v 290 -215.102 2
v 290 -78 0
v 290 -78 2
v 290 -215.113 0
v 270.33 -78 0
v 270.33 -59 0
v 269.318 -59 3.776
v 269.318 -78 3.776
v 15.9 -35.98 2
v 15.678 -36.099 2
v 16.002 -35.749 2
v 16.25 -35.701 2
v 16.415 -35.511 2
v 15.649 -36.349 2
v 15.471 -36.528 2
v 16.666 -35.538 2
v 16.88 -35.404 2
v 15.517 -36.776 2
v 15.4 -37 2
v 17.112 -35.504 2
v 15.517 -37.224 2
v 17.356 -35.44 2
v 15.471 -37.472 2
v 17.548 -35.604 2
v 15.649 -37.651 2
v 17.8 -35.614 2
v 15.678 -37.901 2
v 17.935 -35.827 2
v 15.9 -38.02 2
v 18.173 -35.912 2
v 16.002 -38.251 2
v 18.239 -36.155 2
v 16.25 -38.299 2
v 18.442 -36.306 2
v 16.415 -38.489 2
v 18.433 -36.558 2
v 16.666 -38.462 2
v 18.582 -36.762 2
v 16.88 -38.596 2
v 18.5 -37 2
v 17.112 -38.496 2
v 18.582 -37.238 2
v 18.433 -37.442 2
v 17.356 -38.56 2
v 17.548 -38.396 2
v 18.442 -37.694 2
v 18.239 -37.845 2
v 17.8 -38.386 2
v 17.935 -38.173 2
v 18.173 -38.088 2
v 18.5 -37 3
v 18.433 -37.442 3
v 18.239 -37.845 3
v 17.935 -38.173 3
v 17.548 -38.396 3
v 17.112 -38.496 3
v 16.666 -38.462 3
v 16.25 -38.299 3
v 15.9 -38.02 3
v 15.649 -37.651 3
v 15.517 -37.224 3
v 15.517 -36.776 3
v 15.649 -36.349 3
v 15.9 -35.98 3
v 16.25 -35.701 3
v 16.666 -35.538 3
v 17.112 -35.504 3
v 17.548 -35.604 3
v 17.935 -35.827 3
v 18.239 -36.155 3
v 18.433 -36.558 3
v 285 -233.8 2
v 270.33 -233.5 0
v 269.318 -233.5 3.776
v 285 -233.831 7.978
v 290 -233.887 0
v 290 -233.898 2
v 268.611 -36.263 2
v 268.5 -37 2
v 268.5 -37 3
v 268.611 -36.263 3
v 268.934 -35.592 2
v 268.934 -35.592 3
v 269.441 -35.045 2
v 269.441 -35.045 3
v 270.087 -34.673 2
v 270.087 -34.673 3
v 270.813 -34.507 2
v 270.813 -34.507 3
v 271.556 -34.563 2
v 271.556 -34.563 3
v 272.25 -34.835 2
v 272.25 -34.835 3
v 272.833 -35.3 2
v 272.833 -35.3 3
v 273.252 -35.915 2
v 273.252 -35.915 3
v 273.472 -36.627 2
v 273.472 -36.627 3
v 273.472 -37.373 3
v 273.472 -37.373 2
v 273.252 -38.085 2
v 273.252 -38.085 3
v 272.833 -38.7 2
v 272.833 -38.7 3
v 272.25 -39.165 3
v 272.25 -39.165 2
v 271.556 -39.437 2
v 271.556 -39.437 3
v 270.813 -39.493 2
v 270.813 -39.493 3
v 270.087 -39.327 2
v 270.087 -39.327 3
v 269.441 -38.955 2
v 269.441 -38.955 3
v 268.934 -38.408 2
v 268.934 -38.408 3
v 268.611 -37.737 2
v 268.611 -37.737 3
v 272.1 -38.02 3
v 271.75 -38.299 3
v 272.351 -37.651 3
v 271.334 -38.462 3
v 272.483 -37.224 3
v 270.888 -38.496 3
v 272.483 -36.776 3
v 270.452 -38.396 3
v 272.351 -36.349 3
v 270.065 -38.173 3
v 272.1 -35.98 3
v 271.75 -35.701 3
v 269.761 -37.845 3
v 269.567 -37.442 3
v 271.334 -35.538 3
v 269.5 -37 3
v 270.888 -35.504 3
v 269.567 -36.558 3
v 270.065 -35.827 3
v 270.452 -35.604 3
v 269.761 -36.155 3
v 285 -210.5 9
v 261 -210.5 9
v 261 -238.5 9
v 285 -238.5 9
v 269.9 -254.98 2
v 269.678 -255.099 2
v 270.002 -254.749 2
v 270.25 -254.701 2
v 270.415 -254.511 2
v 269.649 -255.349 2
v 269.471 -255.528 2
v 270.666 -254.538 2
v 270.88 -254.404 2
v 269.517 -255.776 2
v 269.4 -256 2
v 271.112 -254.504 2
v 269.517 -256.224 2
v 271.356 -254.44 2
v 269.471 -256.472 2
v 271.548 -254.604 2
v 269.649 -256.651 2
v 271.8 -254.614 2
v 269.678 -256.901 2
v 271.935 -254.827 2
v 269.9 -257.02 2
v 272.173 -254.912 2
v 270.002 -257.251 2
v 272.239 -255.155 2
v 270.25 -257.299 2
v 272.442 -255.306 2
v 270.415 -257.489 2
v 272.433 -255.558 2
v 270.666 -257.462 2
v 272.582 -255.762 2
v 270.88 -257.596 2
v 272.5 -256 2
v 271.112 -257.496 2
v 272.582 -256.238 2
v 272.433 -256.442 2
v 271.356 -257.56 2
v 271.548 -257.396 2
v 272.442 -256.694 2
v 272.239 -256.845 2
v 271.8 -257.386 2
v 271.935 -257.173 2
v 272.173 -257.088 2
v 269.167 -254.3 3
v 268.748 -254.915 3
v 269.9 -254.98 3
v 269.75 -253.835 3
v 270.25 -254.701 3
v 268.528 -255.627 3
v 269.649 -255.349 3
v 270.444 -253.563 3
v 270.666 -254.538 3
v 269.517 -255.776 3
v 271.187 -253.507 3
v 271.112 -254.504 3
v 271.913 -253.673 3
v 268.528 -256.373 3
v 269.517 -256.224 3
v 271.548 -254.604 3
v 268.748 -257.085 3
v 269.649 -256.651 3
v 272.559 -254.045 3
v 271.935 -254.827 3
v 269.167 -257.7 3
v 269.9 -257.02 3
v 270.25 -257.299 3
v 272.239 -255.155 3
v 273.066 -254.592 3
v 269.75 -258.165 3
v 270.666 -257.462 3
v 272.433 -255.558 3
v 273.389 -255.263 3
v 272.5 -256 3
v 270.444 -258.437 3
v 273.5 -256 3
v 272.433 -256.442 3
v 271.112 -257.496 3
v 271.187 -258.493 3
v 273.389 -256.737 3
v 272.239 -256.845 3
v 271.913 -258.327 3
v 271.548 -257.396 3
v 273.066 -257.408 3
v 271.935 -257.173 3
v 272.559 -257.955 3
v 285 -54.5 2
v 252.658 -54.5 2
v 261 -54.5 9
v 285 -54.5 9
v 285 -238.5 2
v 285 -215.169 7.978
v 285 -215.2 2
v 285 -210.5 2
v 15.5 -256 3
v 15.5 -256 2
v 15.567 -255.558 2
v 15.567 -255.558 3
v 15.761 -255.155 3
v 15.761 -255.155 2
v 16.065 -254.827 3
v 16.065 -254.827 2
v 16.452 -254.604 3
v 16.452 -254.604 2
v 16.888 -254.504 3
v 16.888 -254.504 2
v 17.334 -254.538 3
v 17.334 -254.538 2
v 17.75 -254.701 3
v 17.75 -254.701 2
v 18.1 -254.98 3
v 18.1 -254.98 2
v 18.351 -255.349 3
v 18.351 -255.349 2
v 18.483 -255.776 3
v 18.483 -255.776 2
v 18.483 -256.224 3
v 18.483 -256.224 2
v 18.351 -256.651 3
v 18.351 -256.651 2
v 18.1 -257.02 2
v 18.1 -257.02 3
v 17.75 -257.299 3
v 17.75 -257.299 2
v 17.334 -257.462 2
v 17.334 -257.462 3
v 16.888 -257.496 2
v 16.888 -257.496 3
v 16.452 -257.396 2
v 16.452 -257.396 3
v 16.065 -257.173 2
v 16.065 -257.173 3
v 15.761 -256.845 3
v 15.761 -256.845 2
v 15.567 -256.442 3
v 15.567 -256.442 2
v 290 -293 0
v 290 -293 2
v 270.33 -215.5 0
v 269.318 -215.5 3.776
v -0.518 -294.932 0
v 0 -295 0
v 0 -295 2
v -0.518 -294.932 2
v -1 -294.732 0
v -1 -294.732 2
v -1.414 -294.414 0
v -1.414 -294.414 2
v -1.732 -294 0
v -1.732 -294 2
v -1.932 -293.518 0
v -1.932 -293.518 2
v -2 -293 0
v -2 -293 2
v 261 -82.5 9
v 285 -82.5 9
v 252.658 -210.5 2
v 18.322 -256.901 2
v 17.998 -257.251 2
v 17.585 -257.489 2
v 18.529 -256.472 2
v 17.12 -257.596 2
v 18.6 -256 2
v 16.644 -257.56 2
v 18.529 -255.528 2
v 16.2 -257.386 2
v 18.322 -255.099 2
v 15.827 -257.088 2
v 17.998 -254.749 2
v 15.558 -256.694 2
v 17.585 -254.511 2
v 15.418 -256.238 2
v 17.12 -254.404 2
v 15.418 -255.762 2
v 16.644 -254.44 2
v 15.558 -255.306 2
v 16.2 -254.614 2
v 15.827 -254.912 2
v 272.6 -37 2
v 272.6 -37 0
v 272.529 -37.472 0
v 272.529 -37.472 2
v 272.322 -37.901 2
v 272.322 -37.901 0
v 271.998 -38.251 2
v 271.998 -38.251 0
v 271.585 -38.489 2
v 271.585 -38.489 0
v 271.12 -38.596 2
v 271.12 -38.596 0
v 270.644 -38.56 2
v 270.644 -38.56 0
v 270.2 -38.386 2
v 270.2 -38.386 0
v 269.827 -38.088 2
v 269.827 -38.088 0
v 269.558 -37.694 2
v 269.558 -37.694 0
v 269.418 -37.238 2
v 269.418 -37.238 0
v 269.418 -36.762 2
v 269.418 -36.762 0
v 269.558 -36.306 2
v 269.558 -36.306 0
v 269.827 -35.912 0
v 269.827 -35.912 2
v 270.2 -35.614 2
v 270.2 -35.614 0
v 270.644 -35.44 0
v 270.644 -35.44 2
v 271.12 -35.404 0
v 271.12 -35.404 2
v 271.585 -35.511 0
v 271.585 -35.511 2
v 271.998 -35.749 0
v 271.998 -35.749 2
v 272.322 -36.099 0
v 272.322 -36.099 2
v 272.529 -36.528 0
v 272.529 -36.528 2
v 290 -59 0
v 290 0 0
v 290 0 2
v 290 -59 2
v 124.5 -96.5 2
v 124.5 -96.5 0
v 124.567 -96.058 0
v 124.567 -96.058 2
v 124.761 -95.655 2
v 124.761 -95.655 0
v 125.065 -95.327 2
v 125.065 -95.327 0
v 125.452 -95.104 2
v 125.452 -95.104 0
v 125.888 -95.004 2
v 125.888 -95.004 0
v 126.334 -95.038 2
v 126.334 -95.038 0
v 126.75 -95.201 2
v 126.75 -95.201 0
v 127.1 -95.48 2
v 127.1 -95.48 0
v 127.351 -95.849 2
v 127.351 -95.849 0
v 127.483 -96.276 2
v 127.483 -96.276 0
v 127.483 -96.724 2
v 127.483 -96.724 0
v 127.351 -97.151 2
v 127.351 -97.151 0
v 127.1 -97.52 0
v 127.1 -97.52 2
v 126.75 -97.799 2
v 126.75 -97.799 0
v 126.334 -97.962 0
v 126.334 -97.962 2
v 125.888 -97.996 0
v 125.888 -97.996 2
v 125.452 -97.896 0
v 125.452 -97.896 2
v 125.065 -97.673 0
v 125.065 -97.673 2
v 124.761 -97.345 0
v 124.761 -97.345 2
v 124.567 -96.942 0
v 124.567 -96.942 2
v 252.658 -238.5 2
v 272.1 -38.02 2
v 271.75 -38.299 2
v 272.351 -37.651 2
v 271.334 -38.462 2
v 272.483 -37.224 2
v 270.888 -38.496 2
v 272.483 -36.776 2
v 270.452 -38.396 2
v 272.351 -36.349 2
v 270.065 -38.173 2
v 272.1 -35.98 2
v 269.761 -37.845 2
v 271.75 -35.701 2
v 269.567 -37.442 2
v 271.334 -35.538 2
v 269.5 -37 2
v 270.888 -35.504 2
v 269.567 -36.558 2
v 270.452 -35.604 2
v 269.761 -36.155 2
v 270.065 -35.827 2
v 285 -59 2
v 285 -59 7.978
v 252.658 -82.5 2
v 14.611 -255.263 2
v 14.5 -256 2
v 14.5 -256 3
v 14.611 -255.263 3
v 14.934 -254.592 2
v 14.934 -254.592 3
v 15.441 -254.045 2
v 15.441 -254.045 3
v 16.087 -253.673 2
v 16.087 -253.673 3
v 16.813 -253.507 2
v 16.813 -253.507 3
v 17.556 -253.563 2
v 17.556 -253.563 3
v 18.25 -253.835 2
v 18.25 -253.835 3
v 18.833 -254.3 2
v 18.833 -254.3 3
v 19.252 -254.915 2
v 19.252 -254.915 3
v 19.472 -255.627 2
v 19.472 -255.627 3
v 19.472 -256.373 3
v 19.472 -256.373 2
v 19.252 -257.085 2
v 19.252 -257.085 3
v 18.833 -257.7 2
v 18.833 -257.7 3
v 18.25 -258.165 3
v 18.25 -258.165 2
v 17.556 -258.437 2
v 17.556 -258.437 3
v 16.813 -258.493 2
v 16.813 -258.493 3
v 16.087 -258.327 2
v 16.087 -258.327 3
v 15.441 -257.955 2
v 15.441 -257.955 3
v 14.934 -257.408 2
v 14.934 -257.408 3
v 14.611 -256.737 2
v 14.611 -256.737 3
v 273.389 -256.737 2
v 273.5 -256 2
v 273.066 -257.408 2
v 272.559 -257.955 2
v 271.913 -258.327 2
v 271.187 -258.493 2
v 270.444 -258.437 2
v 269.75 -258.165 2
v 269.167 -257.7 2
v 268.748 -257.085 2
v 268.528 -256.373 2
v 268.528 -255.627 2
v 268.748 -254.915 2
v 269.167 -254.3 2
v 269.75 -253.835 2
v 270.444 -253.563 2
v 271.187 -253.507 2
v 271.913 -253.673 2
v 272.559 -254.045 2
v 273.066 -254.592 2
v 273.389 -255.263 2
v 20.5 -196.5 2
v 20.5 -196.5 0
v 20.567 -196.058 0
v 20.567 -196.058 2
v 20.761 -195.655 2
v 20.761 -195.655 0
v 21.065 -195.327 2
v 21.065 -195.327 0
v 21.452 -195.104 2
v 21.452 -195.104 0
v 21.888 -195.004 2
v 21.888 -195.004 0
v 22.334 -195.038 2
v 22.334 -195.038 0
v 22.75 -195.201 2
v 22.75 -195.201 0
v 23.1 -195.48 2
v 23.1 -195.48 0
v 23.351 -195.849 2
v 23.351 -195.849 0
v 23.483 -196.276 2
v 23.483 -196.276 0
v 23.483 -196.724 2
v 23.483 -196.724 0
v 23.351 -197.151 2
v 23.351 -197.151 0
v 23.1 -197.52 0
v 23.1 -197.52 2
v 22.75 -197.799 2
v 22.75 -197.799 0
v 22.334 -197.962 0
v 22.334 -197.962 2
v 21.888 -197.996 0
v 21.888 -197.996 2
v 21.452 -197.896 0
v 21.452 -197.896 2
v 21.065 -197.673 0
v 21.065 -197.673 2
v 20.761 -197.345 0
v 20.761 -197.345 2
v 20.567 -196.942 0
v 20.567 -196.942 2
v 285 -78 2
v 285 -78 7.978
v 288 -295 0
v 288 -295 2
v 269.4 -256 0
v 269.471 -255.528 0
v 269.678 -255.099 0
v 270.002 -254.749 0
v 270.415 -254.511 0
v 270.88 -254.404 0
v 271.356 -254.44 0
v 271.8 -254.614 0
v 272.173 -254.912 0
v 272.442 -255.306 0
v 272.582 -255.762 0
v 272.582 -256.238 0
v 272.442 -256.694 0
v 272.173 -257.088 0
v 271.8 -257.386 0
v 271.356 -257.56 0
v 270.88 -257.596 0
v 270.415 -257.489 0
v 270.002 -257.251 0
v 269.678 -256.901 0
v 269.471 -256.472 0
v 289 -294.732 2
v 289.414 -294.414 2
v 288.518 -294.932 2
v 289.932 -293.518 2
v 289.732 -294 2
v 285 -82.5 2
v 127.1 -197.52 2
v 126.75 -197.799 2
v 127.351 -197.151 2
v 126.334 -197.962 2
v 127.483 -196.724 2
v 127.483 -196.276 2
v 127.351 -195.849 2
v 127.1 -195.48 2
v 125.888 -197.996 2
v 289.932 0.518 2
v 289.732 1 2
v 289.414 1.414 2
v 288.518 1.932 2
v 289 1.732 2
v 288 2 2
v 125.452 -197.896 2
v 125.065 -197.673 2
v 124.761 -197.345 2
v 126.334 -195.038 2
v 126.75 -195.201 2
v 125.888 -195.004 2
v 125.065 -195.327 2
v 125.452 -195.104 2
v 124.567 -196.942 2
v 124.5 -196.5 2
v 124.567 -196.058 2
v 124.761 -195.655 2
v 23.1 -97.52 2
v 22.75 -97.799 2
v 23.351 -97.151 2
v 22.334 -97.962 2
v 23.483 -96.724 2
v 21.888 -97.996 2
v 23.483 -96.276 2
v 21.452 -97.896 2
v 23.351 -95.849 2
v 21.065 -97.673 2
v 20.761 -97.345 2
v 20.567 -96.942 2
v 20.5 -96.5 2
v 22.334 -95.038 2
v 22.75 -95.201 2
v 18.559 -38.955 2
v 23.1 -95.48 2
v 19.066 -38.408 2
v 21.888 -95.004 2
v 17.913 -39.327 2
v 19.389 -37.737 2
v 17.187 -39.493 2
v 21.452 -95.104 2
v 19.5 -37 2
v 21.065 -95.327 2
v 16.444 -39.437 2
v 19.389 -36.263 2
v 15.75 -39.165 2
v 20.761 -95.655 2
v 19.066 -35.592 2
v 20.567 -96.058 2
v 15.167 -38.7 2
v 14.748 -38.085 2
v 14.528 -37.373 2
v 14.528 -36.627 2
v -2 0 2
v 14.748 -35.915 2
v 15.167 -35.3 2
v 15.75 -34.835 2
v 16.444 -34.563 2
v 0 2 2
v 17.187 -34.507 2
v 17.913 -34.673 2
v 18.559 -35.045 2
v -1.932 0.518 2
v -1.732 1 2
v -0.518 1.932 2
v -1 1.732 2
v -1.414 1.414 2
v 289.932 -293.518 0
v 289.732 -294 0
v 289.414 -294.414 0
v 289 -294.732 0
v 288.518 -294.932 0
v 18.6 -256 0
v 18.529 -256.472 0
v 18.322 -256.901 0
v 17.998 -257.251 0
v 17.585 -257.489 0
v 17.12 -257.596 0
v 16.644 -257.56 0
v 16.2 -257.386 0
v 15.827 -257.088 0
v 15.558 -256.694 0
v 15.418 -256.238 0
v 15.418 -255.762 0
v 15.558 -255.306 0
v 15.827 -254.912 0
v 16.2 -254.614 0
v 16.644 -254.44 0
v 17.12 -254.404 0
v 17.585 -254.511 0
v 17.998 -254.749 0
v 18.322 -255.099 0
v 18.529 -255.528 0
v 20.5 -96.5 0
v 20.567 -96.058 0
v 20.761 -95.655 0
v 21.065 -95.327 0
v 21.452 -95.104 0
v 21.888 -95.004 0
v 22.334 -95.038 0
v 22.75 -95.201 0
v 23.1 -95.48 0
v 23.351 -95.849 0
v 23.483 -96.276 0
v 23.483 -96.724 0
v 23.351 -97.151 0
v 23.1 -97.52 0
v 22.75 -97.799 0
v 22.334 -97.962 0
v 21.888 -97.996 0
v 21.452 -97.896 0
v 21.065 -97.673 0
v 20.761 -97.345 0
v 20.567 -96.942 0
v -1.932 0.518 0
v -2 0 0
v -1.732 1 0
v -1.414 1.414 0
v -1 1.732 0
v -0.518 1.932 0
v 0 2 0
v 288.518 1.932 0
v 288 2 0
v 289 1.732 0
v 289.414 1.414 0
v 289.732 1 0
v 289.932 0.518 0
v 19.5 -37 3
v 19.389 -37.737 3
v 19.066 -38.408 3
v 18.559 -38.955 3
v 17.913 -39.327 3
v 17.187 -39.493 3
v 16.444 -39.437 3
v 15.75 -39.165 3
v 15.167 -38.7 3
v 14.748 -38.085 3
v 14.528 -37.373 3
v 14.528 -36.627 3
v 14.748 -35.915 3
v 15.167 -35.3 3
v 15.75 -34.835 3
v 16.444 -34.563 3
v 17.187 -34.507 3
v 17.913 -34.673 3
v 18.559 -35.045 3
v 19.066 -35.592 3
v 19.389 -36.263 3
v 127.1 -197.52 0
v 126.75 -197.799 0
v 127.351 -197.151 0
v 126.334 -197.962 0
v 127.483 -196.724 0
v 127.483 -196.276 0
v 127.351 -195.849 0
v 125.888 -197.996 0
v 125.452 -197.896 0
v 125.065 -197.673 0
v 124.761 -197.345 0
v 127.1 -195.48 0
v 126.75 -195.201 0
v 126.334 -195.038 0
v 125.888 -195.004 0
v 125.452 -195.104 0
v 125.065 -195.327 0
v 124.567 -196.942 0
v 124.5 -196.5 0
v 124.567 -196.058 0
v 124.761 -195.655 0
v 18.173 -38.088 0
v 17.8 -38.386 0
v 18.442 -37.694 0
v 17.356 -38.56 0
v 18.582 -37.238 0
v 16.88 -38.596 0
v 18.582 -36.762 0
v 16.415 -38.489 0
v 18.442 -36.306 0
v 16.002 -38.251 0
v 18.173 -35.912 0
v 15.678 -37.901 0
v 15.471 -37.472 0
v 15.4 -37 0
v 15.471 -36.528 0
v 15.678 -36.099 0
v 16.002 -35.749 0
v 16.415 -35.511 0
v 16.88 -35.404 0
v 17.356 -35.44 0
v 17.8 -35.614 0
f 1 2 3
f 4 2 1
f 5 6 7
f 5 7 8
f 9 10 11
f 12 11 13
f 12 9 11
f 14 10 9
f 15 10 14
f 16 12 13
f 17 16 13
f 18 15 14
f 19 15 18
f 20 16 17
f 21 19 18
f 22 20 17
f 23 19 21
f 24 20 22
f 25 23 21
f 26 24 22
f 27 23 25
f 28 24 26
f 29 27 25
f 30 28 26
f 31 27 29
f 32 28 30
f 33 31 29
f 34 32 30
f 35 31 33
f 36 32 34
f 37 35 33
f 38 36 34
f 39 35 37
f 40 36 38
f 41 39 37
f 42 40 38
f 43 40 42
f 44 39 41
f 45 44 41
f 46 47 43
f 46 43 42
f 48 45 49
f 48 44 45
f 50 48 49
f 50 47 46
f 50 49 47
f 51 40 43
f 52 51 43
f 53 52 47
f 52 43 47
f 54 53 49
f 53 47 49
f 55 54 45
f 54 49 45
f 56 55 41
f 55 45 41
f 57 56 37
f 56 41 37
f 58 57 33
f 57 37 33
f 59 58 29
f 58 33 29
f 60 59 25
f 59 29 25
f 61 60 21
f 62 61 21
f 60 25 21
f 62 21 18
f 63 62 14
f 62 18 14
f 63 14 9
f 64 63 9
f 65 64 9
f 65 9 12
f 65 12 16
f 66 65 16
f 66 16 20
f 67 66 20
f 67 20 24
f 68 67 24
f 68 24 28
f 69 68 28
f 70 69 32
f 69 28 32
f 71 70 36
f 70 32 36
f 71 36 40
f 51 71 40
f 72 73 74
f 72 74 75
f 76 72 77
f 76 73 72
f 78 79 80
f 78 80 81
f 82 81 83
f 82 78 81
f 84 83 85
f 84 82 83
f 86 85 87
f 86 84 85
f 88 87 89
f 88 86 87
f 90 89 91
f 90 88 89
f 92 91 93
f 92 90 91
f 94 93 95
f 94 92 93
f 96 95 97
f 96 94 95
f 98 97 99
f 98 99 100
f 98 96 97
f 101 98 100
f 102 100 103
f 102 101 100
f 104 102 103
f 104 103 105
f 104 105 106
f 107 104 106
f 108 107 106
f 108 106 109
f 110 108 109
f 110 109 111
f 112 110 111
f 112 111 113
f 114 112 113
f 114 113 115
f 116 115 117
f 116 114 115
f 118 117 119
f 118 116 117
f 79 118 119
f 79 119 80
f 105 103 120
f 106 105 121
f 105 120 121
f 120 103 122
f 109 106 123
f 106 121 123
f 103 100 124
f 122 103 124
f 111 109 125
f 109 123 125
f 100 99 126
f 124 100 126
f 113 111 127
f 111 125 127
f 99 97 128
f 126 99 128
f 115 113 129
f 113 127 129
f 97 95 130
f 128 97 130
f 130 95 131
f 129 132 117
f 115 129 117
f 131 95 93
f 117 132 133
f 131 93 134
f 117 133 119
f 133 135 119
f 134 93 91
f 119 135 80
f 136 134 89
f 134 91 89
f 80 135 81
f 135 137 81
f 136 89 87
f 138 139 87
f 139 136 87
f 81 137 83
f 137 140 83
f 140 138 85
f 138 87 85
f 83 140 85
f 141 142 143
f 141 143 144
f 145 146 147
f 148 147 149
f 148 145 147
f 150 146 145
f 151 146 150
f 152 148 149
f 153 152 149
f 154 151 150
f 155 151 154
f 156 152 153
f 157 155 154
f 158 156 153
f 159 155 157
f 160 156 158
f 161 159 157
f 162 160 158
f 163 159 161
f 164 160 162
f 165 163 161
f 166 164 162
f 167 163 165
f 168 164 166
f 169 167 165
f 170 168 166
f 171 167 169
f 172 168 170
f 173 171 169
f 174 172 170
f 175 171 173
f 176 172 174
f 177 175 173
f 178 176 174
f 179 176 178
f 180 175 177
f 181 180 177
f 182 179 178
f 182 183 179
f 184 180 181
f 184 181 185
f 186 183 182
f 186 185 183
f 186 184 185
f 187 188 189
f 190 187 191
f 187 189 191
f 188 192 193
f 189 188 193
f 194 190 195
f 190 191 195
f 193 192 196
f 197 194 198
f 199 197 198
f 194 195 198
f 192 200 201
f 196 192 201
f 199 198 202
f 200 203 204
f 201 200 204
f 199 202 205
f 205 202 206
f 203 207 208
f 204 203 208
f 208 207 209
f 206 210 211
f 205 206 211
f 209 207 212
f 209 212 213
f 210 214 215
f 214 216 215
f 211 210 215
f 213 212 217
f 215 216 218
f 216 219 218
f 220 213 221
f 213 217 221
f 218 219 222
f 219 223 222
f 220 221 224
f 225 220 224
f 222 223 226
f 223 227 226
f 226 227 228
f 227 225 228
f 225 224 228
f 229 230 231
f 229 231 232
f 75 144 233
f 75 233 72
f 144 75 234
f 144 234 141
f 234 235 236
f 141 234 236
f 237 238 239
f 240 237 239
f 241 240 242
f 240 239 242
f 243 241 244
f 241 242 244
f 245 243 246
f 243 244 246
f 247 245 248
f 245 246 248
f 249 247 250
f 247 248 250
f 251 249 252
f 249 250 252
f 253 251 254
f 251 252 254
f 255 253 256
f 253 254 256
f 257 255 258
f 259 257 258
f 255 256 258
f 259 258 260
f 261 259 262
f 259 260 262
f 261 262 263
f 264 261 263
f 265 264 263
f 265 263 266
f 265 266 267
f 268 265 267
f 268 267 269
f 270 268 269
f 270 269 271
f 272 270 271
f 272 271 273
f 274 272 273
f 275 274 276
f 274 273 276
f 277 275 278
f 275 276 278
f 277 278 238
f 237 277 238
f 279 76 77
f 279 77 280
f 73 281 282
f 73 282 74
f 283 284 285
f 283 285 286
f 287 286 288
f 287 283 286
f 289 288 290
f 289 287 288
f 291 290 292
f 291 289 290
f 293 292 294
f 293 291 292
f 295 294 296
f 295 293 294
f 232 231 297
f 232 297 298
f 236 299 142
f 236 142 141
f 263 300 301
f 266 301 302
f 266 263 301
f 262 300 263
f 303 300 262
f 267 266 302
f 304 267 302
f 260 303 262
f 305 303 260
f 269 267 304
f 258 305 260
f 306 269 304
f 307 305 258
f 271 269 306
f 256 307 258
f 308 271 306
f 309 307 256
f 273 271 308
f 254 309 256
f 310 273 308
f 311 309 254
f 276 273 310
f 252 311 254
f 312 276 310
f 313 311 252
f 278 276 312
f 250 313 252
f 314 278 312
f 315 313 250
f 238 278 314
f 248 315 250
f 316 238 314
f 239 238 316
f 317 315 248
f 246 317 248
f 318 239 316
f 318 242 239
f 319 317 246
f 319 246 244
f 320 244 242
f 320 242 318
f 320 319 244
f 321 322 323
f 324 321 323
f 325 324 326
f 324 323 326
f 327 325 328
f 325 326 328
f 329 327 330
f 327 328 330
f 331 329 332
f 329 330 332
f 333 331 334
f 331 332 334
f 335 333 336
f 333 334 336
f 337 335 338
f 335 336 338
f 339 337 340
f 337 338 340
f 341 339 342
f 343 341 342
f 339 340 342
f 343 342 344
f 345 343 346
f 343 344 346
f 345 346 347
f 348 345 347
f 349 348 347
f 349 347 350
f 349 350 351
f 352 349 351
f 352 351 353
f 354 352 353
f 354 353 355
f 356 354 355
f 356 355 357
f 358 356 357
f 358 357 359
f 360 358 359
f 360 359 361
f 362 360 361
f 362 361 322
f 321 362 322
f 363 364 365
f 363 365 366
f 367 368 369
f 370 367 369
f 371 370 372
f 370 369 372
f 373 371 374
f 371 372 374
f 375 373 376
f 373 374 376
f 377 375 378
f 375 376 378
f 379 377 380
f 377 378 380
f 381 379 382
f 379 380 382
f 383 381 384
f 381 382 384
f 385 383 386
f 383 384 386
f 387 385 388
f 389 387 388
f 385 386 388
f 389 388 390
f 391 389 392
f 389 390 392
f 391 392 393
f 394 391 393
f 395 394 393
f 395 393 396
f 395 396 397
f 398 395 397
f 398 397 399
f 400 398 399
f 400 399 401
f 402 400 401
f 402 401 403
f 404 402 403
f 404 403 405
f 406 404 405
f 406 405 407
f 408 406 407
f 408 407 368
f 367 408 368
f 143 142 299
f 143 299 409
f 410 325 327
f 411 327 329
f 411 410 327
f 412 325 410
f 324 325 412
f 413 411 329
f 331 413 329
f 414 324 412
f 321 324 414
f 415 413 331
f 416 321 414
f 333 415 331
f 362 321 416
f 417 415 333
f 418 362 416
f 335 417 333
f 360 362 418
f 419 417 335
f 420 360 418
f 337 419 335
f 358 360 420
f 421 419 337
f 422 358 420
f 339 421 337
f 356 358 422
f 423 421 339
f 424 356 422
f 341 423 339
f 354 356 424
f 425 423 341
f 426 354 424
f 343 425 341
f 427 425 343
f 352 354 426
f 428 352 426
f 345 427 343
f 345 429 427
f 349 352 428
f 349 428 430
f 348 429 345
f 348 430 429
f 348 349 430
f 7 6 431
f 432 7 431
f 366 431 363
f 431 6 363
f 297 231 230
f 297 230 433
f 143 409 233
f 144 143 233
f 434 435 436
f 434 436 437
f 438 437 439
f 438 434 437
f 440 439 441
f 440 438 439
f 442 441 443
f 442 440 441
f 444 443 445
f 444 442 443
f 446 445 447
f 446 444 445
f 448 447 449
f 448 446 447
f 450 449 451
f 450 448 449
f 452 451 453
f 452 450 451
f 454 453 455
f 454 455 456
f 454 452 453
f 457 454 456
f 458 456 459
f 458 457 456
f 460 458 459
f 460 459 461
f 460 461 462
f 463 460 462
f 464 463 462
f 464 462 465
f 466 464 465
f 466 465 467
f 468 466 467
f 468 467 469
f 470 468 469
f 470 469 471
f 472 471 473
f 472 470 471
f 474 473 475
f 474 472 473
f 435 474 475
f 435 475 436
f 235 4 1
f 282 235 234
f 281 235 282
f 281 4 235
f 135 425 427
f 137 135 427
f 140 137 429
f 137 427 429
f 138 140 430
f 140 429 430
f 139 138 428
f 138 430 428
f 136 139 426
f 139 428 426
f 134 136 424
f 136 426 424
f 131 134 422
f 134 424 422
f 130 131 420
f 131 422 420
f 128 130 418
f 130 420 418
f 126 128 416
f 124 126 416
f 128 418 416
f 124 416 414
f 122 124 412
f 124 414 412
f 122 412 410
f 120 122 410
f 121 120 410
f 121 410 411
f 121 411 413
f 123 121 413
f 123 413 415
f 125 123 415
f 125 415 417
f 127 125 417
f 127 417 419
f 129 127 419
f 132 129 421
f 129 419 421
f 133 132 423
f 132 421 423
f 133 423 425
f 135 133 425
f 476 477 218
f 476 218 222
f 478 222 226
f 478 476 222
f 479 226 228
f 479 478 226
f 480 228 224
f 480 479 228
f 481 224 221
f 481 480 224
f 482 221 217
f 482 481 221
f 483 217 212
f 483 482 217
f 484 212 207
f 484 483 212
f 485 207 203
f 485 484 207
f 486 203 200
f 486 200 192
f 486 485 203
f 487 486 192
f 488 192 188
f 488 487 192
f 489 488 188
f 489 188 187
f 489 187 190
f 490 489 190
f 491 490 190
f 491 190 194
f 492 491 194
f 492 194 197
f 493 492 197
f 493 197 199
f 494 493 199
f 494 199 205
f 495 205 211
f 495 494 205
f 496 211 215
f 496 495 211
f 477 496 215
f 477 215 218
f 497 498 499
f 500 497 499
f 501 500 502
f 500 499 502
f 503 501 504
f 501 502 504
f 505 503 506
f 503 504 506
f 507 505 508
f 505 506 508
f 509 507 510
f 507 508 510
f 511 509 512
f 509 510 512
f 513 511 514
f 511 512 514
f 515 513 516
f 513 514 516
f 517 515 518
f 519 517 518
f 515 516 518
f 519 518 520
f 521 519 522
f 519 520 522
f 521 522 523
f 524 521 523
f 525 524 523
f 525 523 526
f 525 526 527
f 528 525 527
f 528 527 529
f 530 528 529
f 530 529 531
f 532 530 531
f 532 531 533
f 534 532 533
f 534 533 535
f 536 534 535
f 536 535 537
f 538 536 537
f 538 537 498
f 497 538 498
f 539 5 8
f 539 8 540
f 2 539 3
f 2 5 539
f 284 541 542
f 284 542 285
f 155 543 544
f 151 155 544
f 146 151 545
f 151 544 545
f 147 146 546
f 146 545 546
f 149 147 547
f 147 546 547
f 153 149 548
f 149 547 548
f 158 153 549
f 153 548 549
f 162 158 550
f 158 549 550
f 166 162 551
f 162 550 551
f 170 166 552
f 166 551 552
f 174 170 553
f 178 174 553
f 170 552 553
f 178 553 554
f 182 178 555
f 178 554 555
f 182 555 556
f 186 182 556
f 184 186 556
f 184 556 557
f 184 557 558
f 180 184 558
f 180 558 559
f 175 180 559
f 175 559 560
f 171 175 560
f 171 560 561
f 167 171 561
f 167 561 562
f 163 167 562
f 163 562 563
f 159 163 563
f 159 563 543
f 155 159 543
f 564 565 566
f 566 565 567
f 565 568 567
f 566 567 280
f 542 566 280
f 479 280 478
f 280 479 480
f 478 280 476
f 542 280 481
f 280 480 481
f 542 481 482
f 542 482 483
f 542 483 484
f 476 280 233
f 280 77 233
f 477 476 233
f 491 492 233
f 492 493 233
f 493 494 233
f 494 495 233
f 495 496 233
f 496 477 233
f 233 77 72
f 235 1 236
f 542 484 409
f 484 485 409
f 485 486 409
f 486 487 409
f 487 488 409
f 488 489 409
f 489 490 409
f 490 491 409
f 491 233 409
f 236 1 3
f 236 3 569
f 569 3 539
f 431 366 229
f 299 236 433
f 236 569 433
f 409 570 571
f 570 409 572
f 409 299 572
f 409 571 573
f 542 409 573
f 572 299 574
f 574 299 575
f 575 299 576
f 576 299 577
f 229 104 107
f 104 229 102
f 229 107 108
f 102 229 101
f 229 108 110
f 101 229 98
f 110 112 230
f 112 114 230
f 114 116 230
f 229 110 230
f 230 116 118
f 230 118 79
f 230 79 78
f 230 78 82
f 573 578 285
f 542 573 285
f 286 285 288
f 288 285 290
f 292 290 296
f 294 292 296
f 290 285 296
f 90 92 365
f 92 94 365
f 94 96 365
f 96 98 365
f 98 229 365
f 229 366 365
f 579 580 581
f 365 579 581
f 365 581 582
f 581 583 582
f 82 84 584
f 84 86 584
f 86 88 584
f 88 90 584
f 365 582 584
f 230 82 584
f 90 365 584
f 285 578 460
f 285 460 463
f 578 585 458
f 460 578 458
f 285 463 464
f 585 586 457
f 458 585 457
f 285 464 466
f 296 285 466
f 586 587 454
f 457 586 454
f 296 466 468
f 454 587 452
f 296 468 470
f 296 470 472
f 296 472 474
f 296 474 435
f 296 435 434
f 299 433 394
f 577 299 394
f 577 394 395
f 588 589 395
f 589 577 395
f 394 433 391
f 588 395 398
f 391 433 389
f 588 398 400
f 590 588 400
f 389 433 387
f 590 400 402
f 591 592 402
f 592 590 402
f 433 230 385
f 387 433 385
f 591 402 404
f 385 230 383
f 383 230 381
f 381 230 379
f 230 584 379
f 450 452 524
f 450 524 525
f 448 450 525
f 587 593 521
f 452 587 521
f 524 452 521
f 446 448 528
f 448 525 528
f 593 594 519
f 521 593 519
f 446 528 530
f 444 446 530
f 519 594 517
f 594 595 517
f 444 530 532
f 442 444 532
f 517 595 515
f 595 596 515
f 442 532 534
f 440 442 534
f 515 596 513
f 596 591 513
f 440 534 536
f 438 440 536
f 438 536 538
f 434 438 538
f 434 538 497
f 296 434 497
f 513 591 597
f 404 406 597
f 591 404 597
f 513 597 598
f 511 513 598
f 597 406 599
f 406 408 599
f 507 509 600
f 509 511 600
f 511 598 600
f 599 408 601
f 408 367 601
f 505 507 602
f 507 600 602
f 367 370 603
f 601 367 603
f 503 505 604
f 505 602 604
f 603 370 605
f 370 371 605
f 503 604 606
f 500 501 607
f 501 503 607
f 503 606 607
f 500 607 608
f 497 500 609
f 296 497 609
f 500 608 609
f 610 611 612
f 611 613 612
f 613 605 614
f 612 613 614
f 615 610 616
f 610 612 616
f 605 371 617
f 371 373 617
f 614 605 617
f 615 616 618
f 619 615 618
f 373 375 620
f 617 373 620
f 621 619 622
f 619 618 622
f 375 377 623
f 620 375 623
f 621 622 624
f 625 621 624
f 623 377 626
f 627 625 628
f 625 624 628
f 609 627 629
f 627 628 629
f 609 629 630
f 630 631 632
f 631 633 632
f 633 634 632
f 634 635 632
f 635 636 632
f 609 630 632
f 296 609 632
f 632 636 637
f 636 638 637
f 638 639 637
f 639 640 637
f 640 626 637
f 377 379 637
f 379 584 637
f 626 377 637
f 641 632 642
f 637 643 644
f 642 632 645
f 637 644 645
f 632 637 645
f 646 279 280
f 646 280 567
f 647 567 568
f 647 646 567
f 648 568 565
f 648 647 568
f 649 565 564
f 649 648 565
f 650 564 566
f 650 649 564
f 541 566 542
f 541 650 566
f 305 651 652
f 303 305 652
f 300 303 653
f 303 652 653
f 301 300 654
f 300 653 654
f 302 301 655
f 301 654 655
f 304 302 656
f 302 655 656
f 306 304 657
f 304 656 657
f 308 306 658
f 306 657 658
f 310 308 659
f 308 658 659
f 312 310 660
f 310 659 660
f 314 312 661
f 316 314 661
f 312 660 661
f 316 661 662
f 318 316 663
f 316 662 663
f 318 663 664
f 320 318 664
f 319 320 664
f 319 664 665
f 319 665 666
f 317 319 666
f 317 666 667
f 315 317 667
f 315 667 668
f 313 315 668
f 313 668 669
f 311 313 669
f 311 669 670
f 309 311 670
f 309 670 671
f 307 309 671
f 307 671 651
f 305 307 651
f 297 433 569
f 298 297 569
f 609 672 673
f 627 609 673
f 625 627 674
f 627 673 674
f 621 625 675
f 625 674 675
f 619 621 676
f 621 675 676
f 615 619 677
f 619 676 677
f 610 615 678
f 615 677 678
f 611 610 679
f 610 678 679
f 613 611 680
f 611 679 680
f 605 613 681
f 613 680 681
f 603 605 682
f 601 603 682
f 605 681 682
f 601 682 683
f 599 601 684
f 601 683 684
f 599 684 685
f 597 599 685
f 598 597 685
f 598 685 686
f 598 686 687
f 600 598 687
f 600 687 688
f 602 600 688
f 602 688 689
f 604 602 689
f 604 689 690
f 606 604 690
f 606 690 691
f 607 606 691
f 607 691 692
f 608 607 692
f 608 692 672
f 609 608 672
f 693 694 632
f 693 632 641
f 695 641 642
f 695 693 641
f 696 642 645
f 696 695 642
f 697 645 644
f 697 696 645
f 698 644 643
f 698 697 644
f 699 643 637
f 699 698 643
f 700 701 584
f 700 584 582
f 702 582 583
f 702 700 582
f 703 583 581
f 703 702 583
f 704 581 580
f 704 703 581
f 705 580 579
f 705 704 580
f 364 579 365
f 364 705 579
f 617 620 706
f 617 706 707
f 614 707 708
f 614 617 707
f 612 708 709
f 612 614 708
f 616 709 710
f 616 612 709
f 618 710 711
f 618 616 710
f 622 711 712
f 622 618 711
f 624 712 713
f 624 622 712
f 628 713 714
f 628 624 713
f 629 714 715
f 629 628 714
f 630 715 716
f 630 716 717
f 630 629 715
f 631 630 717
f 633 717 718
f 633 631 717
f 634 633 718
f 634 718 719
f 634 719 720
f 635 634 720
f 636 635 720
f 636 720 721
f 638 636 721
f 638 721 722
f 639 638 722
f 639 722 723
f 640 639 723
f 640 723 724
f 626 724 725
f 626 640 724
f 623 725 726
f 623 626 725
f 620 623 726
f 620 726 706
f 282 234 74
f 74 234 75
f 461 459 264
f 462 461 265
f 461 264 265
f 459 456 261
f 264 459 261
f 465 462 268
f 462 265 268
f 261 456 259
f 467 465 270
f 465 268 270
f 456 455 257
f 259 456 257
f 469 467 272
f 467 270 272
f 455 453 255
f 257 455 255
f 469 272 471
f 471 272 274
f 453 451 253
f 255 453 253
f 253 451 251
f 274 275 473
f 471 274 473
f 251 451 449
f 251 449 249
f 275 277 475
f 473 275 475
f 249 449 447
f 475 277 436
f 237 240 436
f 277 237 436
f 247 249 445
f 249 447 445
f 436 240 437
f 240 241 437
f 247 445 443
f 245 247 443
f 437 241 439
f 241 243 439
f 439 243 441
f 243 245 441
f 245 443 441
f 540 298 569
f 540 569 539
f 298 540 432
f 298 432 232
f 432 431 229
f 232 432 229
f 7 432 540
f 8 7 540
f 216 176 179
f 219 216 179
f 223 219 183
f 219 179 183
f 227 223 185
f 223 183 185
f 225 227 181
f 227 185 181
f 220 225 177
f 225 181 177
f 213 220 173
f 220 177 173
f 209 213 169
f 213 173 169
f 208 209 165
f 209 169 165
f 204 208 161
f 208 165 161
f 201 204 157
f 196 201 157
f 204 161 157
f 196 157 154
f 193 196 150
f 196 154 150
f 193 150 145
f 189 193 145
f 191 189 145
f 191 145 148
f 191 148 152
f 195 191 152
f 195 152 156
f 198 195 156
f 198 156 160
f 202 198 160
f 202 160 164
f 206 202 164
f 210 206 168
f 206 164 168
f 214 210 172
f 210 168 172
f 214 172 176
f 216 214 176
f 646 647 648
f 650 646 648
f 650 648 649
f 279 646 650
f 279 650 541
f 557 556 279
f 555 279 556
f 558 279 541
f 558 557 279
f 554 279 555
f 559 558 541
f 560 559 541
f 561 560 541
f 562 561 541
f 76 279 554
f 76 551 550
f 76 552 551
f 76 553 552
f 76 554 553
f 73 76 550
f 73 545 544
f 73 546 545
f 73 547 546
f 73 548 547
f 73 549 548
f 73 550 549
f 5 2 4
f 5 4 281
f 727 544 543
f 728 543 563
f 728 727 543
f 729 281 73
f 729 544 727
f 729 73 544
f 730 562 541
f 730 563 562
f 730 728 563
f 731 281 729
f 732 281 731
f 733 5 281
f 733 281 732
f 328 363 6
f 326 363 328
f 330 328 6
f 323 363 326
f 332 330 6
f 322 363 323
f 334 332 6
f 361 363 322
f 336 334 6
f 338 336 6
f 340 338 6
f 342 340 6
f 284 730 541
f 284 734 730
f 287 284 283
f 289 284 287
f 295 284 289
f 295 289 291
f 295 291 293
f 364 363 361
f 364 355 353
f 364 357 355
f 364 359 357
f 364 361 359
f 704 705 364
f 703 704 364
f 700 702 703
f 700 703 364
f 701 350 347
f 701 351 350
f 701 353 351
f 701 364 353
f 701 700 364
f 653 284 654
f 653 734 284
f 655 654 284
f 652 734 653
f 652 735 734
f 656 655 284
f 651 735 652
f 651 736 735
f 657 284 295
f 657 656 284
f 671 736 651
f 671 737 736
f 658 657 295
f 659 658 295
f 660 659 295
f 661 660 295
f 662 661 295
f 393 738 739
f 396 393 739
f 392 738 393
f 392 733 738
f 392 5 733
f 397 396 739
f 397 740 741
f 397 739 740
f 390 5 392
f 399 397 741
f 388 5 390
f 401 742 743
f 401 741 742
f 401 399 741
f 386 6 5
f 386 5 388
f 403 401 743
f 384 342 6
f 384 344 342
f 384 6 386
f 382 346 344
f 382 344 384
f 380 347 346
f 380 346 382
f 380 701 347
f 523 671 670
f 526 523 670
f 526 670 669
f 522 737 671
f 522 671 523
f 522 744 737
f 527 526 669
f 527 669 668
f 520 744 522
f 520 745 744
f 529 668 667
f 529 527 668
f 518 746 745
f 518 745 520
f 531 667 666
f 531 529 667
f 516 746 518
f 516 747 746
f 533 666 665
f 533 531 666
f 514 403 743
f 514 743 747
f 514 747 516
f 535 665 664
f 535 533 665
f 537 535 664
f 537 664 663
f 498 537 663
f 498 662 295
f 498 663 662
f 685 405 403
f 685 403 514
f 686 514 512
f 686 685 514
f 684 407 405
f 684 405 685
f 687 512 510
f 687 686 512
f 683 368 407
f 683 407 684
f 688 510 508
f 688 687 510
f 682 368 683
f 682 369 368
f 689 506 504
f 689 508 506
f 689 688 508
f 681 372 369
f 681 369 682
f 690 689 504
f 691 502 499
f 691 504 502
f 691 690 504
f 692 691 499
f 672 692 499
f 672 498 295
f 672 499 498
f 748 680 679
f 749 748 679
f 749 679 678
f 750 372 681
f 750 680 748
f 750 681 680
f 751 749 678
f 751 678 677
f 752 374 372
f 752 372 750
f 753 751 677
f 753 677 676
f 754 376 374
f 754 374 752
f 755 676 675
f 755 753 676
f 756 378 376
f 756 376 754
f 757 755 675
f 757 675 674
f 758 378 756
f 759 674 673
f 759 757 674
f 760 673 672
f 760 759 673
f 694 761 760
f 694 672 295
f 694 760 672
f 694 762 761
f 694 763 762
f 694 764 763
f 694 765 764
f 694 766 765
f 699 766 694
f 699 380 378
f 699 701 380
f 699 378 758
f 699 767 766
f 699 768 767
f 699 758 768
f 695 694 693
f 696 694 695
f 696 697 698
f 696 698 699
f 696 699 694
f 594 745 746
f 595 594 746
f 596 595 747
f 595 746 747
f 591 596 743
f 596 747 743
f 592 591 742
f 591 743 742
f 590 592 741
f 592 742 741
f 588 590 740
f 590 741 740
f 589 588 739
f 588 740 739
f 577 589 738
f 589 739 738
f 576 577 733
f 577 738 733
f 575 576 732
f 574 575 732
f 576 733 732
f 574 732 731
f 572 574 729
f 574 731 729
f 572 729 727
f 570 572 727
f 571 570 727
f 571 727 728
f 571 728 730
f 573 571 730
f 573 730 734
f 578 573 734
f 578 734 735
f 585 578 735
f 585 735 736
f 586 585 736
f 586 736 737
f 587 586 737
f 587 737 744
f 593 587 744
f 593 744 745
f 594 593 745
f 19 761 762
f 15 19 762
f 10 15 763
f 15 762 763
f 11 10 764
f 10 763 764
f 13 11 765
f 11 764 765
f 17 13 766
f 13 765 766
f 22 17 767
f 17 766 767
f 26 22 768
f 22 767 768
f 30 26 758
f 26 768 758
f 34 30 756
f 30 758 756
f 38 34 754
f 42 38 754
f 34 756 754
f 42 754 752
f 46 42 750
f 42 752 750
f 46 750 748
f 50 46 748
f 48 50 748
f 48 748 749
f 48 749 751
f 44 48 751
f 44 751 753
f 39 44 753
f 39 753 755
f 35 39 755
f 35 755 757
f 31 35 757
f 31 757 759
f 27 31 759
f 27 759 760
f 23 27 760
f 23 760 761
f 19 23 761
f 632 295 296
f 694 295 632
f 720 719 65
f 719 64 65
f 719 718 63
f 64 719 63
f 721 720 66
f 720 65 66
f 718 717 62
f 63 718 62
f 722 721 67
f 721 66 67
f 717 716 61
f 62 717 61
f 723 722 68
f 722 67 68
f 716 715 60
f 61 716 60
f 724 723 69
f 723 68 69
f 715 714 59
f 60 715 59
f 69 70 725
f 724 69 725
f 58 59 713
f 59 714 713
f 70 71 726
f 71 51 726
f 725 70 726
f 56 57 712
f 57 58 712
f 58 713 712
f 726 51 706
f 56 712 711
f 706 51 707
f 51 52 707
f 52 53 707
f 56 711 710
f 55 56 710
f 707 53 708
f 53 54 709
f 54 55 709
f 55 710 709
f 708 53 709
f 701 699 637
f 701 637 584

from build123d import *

# Parameters (mm, degrees)
BOSS_EXTRUDE1_DEPTH = 2
SKETCH4_R           = 1.6
CUT_EXTRUDE4_DEPTH  = 414.677410551
SKETCH3_R           = 2.5
SKETCH3_R_2         = 1.5
BOSS_EXTRUDE3_DEPTH = 1
SKETCH5_W           = 24
SKETCH5_H           = 28
BOSS_EXTRUDE2_DEPTH = 7
SKETCH2_W           = 19
SKETCH2_H           = 24.51763809
CUT_EXTRUDE5_DEPTH  = 9
BOSS_EXTRUDE4_REACH = 375.267
SKETCH8_W           = 28
SKETCH8_H           = 24
SKETCH9_R           = 1.5
CUT_EXTRUDE7_DEPTH  = 414.770467772


with BuildPart() as part:
    # Sketch1 → Boss-Extrude1 (new body)
    with BuildSketch(Plane.XY):
        with BuildLine():
            Line((0, 2), (288, 2))
            ThreePointArc((288, 2), (289.414213562, 1.414213562), (290, 0))
            Line((290, 0), (290, -293))
            ThreePointArc((290, -293), (289.414213562, -294.414213562), (288, -295))
            Line((288, -295), (0, -295))
            ThreePointArc((0, -295), (-1.414213562, -294.414213562), (-2, -293))
            Line((-2, -293), (-2, 0))
            ThreePointArc((-2, 0), (-1.414213562, 1.414213562), (0, 2))
        make_face()
    extrude(amount=BOSS_EXTRUDE1_DEPTH)

    # Sketch4 → Cut-Extrude4 (cut, through all)
    with BuildSketch(Plane(origin=(0, 0, 0), x_dir=(-1, 0, 0), z_dir=(0, 0, -1))):
        with Locations((-271, -256)):
            Circle(SKETCH4_R)
        with Locations(Location((-271, -37, 0), (0, 0, 180))):
            Circle(SKETCH4_R)
        with Locations(Location((-17, -256, 0), (0, 0, 180))):
            Circle(SKETCH4_R)
        with Locations((-17, -37)):
            Circle(SKETCH4_R)
    extrude(amount=-CUT_EXTRUDE4_DEPTH, mode=Mode.SUBTRACT)

    # Sketch3 → Boss-Extrude3 (add)
    # profile 1 of 4: a face of its own
    with BuildSketch(Plane(origin=(0, 0, 2), x_dir=(-1, 0, 0), z_dir=(0, 0, -1))):
        with Locations((-271, -37)):
            Circle(SKETCH3_R)
        with Locations((-271, -37)):
            Circle(SKETCH3_R_2, mode=Mode.SUBTRACT)
    # profile 2 of 4: a face of its own
    with BuildSketch(Plane(origin=(0, 0, 2), x_dir=(-1, 0, 0), z_dir=(0, 0, -1))):
        with Locations(Location((-17, -37, 0), (0, 0, 180))):
            Circle(SKETCH3_R)
        with Locations(Location((-17, -37, 0), (0, 0, 180))):
            Circle(SKETCH3_R_2, mode=Mode.SUBTRACT)
    # profile 3 of 4: a face of its own
    with BuildSketch(Plane(origin=(0, 0, 2), x_dir=(-1, 0, 0), z_dir=(0, 0, -1))):
        with Locations((-17, -256)):
            Circle(SKETCH3_R)
        with Locations((-17, -256)):
            Circle(SKETCH3_R_2, mode=Mode.SUBTRACT)
    # profile 4 of 4: a face of its own
    with BuildSketch(Plane(origin=(0, 0, 2), x_dir=(-1, 0, 0), z_dir=(0, 0, -1))):
        with Locations(Location((-271, -256, 0), (0, 0, 180))):
            Circle(SKETCH3_R)
        with Locations(Location((-271, -256, 0), (0, 0, 180))):
            Circle(SKETCH3_R_2, mode=Mode.SUBTRACT)
    extrude(amount=-BOSS_EXTRUDE3_DEPTH)

    # Sketch5 → Boss-Extrude2 (add)
    with BuildSketch(Plane.XY.offset(2)):
        with Locations((273, -68.5)):
            Rectangle(SKETCH5_W, SKETCH5_H)
        with Locations((273, -224.5)):
            Rectangle(SKETCH5_W, SKETCH5_H)
    extrude(amount=BOSS_EXTRUDE2_DEPTH)

    # Sketch2 → Cut-Extrude5 (cut)
    with BuildSketch(Plane(origin=(19.360490202, 0, -72.51763809), x_dir=(0, -1, 0), z_dir=(-0.25881904510252135, 0, 0.9659258262890681))):
        Polygon((234, 285.704276061), (215, 285.704276061), (215.5, 261.186637971), (233.5, 261.186637971), align=None)
        with Locations((68.5, 273.445457016)):
            Rectangle(SKETCH2_W, SKETCH2_H)
    extrude(amount=CUT_EXTRUDE5_DEPTH, mode=Mode.SUBTRACT)

    # Sketch8 → Boss-Extrude4 (add, up to next)
    with BuildSketch(Plane(origin=(103.407277926, 0, -123.235994969), x_dir=(0, -1, 0), z_dir=(-0.6427876096865406, 0, 0.7660444431189771)), mode=Mode.PRIVATE) as boss_extrude4_sk1:
        with Locations((68.5, 193.722688141)):
            Rectangle(SKETCH8_W, SKETCH8_H)
    boss_extrude4_tool1 = extrude(boss_extrude4_sk1.sketch, amount=-BOSS_EXTRUDE4_REACH, mode=Mode.PRIVATE) - part.part
    # Sketch8 → Boss-Extrude4 (add, up to next)
    with BuildSketch(Plane(origin=(103.407277926, 0, -123.235994969), x_dir=(0, -1, 0), z_dir=(-0.6427876096865406, 0, 0.7660444431189771)), mode=Mode.PRIVATE) as boss_extrude4_sk2:
        with Locations((224.5, 193.722688141)):
            Rectangle(SKETCH8_W, SKETCH8_H)
    boss_extrude4_tool2 = extrude(boss_extrude4_sk2.sketch, amount=-BOSS_EXTRUDE4_REACH, mode=Mode.PRIVATE) - part.part
    add(boss_extrude4_tool1.solids().sort_by_distance((251.807467, -68.5, 1.286549))[0])
    add(boss_extrude4_tool2.solids().sort_by_distance((251.807467, -224.5, 1.286549))[0])

    # Sketch9 → Cut-Extrude7 (cut, through all)
    with BuildSketch(Plane(origin=(0, 0, 0), x_dir=(-1, 0, 0), z_dir=(0, 0, -1))):
        with Locations((-126, -196.5)):
            Circle(SKETCH9_R)
        with Locations((-126, -96.5)):
            Circle(SKETCH9_R)
        with Locations((-22, -96.5)):
            Circle(SKETCH9_R)
        with Locations((-22, -196.5)):
            Circle(SKETCH9_R)
    extrude(amount=-CUT_EXTRUDE7_DEPTH, mode=Mode.SUBTRACT)


solid = part.part
